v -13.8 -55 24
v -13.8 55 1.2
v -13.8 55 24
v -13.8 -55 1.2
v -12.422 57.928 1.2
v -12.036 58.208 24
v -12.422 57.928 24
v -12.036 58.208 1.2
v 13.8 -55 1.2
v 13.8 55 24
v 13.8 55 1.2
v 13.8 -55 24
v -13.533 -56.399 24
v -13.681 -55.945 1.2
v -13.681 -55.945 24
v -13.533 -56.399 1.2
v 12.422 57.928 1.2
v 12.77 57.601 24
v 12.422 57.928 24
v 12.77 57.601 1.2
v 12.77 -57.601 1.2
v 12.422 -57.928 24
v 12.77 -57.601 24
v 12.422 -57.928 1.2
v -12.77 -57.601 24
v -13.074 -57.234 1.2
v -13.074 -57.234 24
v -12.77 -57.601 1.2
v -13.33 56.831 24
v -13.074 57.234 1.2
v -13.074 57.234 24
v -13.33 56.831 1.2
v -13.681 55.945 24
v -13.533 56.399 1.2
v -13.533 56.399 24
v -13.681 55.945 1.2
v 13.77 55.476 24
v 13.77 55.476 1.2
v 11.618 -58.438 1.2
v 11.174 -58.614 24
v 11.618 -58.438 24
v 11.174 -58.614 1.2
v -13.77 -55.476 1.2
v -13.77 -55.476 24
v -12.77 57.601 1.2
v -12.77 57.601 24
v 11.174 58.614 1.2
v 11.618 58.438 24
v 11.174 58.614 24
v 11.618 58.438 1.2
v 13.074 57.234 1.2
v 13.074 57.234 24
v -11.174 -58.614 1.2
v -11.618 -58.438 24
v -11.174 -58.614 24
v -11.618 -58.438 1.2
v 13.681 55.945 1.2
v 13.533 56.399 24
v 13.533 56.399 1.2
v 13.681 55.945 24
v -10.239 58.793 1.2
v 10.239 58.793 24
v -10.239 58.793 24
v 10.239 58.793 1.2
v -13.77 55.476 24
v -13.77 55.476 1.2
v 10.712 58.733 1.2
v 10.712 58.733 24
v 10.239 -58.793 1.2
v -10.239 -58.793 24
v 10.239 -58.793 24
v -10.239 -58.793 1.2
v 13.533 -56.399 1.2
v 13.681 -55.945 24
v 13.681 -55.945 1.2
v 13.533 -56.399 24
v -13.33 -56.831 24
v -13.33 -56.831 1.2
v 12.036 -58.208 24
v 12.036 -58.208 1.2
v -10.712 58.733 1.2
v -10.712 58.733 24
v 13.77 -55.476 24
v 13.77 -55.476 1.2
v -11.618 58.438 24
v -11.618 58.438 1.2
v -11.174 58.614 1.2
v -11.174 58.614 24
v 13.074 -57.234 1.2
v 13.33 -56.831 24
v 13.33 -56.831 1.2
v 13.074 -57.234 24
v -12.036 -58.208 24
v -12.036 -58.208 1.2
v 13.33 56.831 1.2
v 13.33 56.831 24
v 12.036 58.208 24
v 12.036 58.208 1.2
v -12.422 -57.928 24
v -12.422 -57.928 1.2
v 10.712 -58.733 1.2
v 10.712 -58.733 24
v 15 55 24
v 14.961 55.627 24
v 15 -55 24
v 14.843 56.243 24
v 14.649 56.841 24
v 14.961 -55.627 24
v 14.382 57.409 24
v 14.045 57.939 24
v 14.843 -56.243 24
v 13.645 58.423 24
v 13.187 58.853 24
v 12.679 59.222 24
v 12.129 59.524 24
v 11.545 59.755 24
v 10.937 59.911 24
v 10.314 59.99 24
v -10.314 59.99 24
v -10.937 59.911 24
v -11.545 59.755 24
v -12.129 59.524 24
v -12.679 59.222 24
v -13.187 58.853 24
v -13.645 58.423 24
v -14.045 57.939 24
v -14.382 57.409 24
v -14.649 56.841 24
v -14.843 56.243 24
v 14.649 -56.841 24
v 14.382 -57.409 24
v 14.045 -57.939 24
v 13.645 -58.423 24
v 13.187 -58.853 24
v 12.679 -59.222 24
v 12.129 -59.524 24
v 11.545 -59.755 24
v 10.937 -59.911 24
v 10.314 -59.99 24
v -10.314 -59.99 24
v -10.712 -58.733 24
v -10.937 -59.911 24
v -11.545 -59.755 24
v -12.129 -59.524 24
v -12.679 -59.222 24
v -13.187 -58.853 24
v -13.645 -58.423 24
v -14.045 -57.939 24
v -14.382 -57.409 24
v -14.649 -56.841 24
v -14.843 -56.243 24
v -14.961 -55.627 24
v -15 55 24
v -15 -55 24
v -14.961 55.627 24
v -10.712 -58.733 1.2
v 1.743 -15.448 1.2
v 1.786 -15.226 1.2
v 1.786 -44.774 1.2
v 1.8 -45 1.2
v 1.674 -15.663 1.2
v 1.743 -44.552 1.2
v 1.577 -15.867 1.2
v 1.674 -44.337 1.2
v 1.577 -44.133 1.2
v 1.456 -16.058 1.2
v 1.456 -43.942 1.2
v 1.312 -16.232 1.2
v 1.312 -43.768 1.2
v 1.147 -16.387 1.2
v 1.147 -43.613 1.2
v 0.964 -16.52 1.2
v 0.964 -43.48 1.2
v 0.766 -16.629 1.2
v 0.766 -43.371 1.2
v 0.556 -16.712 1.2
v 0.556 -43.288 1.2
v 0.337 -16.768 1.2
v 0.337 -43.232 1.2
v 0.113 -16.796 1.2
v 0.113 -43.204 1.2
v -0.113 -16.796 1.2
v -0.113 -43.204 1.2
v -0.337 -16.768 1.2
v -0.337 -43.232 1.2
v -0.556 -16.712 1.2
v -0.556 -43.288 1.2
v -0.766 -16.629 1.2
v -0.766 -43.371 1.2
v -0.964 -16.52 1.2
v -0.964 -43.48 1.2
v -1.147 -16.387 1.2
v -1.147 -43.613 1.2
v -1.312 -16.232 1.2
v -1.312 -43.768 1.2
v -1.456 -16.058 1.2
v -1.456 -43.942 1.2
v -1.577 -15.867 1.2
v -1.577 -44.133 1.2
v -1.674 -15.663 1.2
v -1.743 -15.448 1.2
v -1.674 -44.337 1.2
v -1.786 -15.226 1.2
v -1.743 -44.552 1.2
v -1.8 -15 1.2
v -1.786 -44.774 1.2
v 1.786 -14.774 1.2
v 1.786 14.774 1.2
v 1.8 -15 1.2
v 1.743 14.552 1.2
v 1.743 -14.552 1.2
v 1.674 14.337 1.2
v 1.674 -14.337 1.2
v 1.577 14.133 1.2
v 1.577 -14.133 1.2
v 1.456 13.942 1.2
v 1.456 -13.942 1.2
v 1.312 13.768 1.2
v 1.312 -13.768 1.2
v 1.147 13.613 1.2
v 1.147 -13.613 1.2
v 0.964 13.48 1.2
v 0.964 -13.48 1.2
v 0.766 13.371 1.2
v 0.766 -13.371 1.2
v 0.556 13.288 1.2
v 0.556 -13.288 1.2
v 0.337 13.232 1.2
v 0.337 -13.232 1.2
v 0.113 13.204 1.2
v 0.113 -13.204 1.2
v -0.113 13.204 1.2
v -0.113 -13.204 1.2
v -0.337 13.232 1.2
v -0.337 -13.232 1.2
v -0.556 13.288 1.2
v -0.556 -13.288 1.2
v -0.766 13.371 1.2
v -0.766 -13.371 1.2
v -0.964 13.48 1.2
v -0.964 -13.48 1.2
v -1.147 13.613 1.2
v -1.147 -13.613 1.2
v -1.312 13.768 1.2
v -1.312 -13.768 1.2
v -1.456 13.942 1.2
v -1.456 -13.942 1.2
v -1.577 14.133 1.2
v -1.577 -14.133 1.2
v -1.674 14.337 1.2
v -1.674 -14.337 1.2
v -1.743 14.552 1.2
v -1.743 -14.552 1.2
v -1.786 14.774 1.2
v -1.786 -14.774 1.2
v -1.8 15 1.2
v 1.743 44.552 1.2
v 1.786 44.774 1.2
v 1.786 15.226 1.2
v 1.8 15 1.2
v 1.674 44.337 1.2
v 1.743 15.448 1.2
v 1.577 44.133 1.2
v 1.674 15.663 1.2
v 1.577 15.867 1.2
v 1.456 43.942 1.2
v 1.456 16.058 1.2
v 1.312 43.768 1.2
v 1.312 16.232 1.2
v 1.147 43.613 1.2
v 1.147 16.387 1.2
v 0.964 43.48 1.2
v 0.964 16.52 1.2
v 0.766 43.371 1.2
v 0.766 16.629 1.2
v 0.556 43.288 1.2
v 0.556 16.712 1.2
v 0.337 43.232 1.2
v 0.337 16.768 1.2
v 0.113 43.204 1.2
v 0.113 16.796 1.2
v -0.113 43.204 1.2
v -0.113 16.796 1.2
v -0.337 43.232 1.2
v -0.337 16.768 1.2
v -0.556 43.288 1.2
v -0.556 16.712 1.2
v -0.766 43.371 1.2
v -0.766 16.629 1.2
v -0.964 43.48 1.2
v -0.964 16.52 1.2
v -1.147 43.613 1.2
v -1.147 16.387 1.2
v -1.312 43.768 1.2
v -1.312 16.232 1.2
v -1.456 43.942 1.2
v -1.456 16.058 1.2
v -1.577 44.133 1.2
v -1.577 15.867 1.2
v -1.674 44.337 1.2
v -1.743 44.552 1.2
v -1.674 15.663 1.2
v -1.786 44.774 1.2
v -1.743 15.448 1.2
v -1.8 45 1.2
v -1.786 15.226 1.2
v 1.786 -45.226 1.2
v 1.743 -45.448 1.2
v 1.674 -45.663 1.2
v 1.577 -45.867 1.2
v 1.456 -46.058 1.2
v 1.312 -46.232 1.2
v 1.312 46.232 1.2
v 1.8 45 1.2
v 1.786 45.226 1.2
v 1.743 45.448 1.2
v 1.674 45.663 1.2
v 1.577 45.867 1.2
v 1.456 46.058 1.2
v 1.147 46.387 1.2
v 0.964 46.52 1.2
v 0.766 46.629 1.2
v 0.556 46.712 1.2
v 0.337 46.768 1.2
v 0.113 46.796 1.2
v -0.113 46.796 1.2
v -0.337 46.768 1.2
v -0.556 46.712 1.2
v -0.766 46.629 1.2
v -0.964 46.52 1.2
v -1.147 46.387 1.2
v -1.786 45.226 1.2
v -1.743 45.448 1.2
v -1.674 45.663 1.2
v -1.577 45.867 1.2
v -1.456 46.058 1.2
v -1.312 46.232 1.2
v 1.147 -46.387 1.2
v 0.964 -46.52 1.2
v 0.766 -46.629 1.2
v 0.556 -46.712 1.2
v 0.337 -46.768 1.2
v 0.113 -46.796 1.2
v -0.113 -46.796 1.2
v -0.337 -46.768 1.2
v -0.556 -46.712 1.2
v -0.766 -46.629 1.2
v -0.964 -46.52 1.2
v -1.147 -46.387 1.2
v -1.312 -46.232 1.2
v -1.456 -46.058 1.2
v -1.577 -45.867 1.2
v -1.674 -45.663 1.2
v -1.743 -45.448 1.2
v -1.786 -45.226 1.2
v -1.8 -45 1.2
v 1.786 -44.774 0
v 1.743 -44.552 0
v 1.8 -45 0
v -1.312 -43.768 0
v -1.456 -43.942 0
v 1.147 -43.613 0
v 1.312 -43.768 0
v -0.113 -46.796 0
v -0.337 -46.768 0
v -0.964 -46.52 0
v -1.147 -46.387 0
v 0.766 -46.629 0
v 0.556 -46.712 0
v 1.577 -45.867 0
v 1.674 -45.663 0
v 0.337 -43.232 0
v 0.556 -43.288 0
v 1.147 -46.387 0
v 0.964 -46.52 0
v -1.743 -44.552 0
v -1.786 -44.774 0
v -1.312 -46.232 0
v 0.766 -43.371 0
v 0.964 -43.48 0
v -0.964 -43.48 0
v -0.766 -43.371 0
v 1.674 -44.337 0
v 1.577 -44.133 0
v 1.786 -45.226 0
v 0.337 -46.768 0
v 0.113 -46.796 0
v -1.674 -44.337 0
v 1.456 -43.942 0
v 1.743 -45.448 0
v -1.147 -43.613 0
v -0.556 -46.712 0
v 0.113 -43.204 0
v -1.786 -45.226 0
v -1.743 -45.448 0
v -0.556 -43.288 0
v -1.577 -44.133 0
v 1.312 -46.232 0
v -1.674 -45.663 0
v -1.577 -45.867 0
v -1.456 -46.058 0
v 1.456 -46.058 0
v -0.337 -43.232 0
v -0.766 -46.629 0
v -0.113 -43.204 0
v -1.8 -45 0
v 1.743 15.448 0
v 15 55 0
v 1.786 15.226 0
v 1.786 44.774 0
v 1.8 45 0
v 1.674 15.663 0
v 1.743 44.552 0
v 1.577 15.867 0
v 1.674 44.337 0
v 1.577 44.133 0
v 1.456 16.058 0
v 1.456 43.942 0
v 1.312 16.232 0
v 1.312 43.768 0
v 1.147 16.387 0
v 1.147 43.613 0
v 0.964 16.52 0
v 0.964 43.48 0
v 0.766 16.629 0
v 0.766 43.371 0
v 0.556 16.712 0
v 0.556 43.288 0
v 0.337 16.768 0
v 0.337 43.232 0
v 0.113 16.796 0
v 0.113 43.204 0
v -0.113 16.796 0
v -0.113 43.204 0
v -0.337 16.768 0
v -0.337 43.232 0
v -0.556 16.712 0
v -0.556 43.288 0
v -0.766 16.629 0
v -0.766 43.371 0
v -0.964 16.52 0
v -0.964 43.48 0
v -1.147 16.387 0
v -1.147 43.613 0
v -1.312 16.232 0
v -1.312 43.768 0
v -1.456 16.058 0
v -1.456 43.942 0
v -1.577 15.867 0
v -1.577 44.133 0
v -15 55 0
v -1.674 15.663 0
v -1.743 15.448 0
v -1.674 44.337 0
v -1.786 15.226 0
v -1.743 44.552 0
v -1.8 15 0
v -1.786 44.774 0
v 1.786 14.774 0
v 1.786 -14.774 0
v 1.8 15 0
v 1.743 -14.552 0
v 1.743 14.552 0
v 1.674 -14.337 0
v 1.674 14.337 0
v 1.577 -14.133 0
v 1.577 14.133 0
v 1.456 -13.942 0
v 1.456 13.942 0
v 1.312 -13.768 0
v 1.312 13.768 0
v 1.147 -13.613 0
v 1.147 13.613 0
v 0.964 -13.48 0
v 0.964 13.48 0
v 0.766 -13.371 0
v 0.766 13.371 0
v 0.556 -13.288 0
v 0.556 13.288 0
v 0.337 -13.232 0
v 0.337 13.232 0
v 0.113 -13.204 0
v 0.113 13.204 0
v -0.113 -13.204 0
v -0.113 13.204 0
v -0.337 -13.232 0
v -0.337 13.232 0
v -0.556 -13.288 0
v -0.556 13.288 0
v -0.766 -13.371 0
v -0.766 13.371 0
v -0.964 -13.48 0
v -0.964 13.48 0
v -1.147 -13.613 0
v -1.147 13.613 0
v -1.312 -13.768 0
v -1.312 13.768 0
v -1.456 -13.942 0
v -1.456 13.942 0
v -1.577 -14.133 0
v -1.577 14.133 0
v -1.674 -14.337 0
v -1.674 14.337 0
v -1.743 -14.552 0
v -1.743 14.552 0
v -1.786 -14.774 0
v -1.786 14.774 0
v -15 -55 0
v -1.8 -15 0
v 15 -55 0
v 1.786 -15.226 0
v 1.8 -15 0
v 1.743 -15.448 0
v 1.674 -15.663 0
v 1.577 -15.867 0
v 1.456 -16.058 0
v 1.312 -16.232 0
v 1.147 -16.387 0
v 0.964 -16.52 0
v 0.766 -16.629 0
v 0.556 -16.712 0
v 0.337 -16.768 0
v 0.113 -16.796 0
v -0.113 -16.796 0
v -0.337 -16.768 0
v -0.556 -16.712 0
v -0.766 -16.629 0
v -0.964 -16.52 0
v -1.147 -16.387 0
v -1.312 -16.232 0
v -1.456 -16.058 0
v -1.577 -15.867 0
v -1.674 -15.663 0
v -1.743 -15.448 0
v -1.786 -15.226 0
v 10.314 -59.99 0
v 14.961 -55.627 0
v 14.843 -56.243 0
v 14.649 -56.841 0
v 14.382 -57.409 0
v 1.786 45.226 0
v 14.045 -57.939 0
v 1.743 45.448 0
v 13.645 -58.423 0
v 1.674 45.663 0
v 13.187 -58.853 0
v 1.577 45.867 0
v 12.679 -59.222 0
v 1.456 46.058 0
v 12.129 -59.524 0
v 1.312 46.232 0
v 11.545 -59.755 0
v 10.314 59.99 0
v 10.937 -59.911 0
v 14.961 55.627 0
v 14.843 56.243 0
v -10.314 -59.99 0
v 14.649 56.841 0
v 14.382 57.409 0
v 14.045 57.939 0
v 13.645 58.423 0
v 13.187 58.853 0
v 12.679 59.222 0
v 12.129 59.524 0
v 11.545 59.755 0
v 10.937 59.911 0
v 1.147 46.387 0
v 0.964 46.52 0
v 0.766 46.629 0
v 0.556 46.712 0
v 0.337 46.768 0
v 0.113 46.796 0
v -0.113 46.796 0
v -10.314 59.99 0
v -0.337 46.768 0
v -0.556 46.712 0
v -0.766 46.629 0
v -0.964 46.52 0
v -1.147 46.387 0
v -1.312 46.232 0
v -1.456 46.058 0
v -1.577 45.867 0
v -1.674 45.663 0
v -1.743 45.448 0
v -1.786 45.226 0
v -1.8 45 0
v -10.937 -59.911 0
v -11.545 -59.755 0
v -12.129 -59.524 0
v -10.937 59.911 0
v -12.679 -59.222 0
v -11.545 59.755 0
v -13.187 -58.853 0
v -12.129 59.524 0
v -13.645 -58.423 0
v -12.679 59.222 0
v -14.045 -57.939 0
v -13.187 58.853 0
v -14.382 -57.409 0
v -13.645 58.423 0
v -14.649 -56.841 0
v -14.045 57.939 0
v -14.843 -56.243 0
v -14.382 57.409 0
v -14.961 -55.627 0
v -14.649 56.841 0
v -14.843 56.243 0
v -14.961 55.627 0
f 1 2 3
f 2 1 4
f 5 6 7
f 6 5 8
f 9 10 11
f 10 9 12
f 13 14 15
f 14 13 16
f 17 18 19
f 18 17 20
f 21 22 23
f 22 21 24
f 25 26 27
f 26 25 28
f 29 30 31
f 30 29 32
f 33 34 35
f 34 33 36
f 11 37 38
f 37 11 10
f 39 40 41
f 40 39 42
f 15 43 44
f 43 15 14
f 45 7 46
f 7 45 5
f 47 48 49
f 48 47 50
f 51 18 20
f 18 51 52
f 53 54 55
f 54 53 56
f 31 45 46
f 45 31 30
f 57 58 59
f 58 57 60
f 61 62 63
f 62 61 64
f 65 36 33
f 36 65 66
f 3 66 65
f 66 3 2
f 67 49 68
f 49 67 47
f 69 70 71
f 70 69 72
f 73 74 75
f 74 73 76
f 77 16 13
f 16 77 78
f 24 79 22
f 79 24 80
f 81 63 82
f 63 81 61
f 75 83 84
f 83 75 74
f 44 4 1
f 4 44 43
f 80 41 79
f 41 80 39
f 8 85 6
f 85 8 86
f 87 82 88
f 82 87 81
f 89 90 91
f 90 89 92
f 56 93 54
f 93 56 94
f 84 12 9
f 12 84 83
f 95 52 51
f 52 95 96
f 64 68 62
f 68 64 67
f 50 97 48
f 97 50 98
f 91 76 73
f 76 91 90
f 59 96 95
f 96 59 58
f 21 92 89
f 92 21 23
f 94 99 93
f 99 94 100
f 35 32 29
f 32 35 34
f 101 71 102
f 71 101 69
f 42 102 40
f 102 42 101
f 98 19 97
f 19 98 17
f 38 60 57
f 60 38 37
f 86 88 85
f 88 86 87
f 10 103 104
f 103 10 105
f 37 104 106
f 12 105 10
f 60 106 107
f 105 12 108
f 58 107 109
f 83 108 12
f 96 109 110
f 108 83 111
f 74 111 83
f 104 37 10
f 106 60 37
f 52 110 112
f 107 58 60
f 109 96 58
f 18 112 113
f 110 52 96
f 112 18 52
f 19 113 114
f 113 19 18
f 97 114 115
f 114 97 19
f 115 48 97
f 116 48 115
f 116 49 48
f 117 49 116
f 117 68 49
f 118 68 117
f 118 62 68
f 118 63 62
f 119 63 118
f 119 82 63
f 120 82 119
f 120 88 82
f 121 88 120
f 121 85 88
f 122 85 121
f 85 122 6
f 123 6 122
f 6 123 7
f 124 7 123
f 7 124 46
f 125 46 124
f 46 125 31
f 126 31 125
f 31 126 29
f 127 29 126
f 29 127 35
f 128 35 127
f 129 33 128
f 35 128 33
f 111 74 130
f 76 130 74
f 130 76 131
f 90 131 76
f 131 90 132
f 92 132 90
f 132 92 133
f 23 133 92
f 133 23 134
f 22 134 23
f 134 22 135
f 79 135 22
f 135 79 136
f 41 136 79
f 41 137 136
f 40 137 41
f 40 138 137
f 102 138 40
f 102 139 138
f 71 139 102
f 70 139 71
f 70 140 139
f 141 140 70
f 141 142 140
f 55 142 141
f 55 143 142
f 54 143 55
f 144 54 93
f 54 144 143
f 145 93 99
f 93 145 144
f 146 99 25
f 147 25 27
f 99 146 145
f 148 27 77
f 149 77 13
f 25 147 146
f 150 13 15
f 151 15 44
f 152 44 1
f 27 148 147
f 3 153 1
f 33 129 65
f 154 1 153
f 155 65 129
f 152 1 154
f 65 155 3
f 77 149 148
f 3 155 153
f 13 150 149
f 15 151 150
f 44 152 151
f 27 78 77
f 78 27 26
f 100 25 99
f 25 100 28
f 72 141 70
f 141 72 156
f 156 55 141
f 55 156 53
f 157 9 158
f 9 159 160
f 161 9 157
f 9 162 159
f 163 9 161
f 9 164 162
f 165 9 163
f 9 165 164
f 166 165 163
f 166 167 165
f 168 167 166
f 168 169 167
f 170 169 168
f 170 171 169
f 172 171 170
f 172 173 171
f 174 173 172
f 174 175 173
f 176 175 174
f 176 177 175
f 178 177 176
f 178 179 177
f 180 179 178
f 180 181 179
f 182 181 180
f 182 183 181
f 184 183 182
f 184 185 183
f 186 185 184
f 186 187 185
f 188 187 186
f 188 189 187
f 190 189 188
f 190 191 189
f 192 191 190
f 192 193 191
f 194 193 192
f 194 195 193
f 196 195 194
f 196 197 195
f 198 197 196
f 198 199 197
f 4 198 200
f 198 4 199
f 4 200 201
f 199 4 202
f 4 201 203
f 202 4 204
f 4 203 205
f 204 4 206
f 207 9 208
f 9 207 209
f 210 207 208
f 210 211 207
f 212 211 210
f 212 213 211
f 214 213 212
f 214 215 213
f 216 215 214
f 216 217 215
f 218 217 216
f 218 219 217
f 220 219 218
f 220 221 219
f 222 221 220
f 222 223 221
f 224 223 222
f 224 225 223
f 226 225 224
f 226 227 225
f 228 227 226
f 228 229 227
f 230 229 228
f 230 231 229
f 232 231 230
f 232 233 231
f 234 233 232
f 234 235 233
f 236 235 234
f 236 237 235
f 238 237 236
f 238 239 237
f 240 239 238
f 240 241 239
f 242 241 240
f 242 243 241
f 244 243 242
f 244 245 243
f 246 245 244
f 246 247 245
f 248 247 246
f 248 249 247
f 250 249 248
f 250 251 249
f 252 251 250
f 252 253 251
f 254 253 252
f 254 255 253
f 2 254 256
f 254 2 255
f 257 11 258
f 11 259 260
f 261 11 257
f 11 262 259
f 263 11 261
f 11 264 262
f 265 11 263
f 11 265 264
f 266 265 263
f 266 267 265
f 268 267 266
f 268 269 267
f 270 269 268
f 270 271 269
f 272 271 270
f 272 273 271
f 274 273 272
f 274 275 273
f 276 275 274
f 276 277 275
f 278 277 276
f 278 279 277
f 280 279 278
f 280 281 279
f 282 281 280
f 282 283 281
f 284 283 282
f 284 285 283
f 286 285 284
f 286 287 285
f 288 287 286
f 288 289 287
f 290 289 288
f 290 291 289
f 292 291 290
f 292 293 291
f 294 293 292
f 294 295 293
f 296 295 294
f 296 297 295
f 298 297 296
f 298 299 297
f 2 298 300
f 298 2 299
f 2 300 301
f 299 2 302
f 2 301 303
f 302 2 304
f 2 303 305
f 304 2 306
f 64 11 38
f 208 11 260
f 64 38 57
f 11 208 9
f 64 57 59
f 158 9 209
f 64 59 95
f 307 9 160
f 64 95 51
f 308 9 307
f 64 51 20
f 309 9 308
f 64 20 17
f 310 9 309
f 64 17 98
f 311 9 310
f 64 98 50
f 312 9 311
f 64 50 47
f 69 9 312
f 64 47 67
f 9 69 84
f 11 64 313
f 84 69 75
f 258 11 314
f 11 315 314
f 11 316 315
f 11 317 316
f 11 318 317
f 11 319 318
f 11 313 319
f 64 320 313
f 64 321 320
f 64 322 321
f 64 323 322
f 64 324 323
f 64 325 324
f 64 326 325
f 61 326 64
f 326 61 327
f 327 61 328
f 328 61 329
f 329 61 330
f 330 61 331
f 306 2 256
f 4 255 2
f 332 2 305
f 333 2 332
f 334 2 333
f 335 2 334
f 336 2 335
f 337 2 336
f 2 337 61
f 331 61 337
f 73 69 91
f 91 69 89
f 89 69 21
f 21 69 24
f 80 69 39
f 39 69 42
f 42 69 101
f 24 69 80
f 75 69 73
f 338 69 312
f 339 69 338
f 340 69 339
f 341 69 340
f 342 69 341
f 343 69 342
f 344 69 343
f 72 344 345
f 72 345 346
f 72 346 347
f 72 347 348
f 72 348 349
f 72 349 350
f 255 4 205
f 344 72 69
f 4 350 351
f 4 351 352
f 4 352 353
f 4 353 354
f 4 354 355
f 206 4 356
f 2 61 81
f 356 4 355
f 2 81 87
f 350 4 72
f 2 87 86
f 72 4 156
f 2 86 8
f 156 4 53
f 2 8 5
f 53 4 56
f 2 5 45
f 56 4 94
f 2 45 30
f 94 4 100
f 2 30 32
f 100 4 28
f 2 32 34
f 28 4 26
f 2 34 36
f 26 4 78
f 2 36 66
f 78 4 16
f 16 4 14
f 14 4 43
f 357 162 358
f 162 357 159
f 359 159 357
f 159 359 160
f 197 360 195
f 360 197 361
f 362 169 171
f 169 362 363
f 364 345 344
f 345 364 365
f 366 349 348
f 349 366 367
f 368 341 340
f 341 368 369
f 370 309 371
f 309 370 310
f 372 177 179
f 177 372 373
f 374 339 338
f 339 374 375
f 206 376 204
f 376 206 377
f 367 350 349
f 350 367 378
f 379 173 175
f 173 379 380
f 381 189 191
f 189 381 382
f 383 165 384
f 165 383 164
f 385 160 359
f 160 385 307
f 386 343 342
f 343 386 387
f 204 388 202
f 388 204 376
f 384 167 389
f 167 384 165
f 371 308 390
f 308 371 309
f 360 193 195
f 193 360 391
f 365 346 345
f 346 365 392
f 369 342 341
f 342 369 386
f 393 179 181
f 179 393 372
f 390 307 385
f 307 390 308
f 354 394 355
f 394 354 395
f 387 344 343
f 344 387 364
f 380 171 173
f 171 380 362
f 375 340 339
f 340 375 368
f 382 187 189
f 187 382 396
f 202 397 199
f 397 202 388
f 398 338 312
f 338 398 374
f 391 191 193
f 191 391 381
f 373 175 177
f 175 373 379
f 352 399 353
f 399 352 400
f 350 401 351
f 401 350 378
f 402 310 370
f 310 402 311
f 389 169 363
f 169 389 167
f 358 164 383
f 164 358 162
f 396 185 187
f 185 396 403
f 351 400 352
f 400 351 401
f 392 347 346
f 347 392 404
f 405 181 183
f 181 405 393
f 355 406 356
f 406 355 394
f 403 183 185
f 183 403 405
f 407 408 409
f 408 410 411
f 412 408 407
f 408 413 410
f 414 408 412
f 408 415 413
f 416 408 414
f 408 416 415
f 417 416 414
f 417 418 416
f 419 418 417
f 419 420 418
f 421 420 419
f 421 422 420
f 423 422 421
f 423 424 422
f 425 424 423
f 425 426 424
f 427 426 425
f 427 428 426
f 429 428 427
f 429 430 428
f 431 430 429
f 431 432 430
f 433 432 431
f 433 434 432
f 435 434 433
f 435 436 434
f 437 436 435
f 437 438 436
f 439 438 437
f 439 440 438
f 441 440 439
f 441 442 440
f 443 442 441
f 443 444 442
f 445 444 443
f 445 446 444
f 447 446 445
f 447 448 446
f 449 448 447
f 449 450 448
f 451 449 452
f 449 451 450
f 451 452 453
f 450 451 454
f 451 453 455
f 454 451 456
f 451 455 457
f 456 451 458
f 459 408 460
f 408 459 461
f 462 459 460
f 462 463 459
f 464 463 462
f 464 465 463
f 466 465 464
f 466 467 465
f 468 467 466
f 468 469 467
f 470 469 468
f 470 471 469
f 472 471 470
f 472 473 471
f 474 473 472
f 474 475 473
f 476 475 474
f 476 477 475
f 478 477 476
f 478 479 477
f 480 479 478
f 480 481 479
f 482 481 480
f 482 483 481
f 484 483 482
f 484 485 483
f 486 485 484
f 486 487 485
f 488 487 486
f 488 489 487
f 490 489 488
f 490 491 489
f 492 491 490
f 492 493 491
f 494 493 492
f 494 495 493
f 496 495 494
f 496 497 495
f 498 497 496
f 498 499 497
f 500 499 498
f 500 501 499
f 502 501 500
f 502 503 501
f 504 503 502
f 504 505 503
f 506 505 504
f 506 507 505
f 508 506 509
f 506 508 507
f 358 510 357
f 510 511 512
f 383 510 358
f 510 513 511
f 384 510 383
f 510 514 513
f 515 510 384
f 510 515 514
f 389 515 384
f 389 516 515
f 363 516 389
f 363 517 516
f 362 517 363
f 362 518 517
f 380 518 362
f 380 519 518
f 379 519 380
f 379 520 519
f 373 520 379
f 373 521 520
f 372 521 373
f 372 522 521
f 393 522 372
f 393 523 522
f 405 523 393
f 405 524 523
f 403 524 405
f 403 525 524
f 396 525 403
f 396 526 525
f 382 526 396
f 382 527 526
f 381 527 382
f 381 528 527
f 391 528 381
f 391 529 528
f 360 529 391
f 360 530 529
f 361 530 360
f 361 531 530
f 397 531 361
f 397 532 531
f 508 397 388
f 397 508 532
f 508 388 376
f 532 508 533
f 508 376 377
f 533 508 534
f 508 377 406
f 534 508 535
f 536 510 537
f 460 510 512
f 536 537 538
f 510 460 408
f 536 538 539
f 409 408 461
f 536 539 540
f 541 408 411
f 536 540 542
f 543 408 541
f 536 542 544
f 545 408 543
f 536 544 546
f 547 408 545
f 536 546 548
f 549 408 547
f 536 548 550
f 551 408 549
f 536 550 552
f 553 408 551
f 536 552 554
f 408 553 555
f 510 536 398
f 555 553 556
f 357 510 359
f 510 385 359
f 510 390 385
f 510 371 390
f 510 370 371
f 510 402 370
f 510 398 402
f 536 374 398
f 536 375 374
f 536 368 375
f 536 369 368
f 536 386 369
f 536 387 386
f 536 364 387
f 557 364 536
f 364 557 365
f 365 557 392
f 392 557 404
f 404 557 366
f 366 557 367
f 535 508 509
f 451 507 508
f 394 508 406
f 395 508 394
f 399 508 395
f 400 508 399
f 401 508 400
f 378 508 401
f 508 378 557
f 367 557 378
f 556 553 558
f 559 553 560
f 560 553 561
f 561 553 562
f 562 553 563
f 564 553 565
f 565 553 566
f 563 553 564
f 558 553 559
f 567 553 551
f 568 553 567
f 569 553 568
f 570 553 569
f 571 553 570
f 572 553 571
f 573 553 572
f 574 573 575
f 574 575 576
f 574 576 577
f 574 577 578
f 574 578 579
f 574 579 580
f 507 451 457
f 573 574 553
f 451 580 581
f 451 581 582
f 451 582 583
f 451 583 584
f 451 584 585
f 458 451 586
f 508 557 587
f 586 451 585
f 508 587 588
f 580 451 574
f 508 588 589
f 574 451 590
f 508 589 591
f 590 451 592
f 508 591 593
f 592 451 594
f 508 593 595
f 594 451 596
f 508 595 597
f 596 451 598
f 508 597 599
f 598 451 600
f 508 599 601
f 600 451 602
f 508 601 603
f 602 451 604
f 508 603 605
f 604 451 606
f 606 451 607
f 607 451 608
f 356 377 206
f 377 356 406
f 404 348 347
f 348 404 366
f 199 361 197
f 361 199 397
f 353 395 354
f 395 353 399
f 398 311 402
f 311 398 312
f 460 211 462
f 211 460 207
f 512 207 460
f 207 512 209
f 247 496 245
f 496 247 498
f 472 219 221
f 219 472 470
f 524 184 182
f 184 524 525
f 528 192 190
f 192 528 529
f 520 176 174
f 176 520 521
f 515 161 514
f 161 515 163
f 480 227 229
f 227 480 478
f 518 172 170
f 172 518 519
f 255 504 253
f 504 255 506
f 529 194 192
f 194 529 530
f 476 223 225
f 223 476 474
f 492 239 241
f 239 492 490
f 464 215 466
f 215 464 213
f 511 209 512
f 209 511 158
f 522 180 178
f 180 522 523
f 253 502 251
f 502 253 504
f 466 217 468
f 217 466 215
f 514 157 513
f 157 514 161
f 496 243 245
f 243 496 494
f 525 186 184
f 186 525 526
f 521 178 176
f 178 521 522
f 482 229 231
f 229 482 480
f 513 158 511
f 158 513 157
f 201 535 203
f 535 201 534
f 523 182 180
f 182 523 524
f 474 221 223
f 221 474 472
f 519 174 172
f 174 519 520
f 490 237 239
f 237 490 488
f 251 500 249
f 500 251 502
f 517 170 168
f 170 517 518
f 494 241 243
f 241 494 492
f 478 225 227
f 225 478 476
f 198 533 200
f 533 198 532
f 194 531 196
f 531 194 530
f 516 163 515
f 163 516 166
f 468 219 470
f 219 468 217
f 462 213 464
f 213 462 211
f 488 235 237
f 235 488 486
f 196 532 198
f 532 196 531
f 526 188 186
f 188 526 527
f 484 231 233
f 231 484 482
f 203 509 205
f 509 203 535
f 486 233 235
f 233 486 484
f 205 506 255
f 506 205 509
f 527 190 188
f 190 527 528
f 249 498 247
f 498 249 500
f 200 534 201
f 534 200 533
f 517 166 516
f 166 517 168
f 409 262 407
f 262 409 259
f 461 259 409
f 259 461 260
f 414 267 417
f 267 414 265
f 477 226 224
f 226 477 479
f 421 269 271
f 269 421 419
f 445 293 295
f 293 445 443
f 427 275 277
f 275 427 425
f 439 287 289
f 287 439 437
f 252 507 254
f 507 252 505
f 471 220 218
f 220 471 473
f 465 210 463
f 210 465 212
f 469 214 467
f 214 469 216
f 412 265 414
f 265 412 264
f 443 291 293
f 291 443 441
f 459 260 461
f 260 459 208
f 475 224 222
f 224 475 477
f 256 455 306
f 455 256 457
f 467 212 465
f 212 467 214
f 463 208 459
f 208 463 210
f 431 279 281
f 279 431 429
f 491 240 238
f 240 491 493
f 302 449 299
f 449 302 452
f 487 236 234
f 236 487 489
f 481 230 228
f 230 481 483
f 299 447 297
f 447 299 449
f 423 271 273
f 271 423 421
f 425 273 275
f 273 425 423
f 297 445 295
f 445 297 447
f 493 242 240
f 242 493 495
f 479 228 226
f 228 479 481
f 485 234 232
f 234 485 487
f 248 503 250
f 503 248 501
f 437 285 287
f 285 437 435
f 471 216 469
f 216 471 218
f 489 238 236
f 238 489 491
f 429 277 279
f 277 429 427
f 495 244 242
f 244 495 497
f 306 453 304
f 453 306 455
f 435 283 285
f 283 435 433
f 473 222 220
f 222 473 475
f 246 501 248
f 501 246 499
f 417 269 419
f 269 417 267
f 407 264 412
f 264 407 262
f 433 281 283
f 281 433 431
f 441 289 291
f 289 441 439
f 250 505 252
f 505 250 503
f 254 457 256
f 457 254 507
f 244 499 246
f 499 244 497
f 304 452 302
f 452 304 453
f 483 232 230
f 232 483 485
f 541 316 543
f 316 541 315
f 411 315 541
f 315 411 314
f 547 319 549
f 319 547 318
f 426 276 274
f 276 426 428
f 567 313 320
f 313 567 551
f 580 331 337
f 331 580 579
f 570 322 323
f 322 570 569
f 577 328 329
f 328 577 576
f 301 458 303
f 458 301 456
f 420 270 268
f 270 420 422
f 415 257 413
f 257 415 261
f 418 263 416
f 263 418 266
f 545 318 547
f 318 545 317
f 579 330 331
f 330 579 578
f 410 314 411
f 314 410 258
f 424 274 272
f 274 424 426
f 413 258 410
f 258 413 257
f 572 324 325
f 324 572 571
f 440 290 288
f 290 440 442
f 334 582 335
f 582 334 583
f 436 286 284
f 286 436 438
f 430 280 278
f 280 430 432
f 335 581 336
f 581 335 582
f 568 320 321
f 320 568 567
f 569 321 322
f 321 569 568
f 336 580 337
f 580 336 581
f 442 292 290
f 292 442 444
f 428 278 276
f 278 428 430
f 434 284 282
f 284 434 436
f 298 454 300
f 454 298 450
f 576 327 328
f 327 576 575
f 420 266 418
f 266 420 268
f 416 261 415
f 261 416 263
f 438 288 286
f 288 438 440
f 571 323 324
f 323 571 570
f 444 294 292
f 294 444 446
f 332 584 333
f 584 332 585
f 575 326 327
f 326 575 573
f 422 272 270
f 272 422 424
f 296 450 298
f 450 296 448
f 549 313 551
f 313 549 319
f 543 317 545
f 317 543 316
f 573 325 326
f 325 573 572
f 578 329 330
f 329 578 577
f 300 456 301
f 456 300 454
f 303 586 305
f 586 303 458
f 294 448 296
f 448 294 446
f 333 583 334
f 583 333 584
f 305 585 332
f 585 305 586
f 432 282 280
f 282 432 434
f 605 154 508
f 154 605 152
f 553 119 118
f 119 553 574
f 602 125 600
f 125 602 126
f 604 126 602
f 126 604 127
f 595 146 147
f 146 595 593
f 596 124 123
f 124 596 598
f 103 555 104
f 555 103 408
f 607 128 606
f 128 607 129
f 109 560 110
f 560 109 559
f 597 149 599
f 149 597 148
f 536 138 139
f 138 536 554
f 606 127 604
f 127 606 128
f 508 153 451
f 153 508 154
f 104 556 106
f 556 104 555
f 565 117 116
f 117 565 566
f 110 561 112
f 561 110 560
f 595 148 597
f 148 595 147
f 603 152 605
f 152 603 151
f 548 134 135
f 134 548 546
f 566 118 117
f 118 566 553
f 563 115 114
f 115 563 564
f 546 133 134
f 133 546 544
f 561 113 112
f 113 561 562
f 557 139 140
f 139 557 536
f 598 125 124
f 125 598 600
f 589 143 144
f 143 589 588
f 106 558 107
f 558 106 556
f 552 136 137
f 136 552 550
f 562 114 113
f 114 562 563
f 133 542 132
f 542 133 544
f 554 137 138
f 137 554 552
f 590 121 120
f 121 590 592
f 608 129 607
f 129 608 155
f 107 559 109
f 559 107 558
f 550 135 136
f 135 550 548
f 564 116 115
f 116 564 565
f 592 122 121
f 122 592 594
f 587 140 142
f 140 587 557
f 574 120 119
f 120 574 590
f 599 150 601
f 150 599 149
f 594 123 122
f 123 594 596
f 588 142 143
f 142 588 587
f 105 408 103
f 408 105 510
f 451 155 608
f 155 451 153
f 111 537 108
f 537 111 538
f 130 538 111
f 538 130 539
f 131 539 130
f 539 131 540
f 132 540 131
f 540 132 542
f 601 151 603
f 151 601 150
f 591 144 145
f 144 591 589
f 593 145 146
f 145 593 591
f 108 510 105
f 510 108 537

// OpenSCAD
$fn = 50;


difference() {
	union() {
		hull() {
			translate(v = [-10.0000000000, 55.0000000000, 0]) {
				cylinder(h = 24, r = 5);
			}
			translate(v = [10.0000000000, 55.0000000000, 0]) {
				cylinder(h = 24, r = 5);
			}
			translate(v = [-10.0000000000, -55.0000000000, 0]) {
				cylinder(h = 24, r = 5);
			}
			translate(v = [10.0000000000, -55.0000000000, 0]) {
				cylinder(h = 24, r = 5);
			}
		}
	}
	union() {
		translate(v = [0, 0, 1.2000000000]) {
			hull() {
				translate(v = [-10.0000000000, 55.0000000000, 0]) {
					cylinder(h = 22.8000000000, r = 3.8000000000);
				}
				translate(v = [10.0000000000, 55.0000000000, 0]) {
					cylinder(h = 22.8000000000, r = 3.8000000000);
				}
				translate(v = [-10.0000000000, -55.0000000000, 0]) {
					cylinder(h = 22.8000000000, r = 3.8000000000);
				}
				translate(v = [10.0000000000, -55.0000000000, 0]) {
					cylinder(h = 22.8000000000, r = 3.8000000000);
				}
			}
		}
		#translate(v = [0.0000000000, -45.0000000000, 0]) {
			cylinder(h = 1.2000000000, r = 1.8000000000);
		}
		#translate(v = [0.0000000000, -15.0000000000, 0]) {
			cylinder(h = 1.2000000000, r = 1.8000000000);
		}
		#translate(v = [0.0000000000, 15.0000000000, 0]) {
			cylinder(h = 1.2000000000, r = 1.8000000000);
		}
		#translate(v = [0.0000000000, 45.0000000000, 0]) {
			cylinder(h = 1.2000000000, r = 1.8000000000);
		}
	}
}
